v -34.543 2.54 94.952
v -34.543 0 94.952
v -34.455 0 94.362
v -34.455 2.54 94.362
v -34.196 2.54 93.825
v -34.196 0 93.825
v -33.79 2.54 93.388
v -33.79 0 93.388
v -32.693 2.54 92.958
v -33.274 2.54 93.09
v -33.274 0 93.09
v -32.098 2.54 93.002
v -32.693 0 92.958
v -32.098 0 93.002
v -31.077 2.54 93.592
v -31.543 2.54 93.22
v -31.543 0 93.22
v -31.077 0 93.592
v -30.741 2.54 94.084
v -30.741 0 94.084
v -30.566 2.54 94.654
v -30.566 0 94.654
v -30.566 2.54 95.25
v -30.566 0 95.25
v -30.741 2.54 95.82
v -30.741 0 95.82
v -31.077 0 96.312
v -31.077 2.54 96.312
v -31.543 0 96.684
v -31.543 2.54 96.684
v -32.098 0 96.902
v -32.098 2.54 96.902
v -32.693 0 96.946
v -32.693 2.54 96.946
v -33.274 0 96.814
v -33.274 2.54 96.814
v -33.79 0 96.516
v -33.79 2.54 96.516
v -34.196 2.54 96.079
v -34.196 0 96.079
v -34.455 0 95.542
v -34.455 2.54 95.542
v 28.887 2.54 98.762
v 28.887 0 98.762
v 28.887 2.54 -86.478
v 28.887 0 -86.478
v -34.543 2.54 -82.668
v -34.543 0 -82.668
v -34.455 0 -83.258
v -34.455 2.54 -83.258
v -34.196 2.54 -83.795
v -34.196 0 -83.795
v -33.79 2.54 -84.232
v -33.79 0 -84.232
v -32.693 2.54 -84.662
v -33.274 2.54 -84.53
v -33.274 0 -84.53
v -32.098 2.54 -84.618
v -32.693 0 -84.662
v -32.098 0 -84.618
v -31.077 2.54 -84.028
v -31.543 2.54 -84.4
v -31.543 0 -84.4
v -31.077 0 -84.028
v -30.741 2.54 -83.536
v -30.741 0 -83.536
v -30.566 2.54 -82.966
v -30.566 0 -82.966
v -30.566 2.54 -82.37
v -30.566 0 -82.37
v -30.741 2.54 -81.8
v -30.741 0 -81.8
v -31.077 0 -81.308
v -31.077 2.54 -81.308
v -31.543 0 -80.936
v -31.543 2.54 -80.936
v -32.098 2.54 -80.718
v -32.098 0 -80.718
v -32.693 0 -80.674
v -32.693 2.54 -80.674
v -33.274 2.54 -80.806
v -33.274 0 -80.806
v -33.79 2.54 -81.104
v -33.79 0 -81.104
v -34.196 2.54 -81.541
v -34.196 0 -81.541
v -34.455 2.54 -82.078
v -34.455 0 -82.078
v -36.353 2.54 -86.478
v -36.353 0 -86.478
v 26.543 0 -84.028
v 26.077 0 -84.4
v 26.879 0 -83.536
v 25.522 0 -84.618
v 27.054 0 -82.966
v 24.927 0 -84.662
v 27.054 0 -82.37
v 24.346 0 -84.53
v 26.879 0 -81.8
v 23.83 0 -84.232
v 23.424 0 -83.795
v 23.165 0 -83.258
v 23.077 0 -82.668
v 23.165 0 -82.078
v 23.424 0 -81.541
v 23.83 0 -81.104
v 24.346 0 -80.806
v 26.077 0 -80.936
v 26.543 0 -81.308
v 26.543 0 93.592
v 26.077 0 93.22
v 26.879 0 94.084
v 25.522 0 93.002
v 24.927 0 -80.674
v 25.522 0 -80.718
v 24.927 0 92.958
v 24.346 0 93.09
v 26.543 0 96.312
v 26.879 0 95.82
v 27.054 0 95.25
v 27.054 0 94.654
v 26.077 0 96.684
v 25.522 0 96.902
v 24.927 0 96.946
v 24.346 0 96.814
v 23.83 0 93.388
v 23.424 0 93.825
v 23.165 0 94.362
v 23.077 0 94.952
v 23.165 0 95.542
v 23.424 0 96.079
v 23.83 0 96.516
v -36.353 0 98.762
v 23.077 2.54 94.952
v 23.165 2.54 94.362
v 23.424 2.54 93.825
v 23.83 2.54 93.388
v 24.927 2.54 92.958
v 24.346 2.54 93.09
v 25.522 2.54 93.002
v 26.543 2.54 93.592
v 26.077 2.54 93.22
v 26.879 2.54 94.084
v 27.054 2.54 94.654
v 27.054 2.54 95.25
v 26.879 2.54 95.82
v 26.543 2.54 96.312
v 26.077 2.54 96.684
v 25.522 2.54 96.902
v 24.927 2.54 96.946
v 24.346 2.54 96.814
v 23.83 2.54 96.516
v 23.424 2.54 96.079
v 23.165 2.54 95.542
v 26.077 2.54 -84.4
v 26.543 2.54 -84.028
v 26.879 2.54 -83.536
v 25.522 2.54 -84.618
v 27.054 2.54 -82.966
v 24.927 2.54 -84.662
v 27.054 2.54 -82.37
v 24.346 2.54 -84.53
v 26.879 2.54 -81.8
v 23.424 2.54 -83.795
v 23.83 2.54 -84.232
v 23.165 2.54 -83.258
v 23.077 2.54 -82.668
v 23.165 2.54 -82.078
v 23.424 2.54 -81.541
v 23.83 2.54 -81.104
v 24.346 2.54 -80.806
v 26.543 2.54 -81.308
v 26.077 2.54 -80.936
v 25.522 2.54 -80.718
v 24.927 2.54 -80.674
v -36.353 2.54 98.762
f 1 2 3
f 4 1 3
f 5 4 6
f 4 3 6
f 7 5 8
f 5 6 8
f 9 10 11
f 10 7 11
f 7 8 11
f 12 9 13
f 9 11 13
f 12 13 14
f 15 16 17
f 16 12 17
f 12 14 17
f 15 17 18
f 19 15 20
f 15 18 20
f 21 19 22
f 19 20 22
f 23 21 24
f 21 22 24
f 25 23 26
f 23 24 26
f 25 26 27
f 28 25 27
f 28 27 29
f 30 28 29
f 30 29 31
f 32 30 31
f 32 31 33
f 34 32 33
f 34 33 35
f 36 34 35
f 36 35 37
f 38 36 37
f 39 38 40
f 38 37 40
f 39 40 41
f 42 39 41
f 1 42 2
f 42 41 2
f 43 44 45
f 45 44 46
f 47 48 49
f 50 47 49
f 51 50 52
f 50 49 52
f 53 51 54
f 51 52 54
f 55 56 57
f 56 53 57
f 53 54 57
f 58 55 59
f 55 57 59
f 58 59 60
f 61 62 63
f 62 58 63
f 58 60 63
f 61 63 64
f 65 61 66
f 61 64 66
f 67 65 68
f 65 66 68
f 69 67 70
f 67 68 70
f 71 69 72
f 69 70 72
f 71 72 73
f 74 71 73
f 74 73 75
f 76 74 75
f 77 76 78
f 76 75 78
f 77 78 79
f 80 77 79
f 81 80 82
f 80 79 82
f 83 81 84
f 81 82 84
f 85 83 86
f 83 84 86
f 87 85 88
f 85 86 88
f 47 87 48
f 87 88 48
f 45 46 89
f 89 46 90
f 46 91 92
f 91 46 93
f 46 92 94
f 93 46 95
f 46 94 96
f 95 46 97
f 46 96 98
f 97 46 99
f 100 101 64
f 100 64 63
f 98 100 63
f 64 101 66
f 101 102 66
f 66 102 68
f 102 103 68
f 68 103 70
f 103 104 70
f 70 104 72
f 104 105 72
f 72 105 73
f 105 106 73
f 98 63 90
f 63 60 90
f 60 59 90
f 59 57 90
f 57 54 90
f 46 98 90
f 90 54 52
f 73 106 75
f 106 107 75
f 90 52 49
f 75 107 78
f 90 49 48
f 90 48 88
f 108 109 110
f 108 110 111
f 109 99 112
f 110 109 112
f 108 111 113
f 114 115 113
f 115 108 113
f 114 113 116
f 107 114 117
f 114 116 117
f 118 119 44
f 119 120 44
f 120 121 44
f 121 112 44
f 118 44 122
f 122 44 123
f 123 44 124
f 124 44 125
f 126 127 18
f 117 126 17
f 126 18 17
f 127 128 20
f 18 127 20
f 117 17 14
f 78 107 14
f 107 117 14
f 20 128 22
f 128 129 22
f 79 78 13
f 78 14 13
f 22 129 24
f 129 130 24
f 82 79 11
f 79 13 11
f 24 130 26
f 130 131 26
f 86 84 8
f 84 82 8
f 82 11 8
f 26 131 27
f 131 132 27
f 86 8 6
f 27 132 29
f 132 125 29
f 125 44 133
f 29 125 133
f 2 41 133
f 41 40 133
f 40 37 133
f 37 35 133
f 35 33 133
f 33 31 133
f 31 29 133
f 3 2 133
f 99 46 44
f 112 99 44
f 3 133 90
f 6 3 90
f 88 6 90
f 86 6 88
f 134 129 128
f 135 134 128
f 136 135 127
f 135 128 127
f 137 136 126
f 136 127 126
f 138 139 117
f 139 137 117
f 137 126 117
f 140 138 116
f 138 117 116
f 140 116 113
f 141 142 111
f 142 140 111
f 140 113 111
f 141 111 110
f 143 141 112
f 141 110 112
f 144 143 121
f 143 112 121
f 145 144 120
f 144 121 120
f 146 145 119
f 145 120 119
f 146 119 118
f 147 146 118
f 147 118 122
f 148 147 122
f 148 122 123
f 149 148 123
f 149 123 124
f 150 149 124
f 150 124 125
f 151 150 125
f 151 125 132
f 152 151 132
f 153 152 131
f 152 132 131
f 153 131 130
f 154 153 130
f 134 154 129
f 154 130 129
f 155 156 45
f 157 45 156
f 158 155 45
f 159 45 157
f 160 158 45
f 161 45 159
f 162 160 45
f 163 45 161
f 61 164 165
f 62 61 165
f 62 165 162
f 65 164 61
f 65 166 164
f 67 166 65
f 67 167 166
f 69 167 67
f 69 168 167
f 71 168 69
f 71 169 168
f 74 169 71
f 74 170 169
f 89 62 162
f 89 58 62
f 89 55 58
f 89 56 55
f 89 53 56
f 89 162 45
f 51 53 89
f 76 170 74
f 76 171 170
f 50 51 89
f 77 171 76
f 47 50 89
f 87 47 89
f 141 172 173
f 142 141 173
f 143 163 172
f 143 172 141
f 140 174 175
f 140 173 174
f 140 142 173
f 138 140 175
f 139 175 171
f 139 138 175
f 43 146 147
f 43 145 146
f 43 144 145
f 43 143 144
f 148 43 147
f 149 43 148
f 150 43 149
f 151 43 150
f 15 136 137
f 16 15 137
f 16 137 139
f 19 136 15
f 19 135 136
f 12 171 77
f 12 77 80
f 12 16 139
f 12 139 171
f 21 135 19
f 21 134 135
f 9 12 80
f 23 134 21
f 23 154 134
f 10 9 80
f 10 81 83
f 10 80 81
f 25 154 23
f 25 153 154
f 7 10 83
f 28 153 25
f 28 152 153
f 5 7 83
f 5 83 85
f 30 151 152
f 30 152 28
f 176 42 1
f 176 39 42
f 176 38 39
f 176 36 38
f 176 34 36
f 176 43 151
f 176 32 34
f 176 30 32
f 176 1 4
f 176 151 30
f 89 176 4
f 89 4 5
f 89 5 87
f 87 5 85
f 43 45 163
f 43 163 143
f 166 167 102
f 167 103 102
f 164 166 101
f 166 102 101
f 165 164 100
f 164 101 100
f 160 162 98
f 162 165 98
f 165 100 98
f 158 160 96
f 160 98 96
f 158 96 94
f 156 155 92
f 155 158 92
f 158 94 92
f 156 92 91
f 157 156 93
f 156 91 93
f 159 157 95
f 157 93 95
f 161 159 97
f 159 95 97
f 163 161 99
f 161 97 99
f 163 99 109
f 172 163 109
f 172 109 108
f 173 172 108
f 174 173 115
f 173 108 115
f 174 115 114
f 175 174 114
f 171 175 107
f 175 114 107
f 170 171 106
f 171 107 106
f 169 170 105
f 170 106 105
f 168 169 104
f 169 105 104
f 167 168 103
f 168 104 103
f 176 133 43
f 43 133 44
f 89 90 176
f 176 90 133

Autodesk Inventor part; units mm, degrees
ref_plane "YZ Plane" through (0, 0, 0) normal (1, 0, 0) x (0, 1, 0)
ref_plane "XZ Plane" through (0, 0, 0) normal (0, 1, 0) x (-1, 0, 0)
ref_plane "XY Plane" through (0, 0, 0) normal (0, 0, 1) x (1, 0, 0)
sketch "Sketch1" plane through (0, 0, 0) normal (0, 1, 0) x (-1, 0, 0)
  line L0 (28.7334, 91.142) -> (-21.2666, 91.142)
  line L1 (-21.2666, 91.142) -> (-21.2666, -78.858)
  line L2 (-21.2666, -78.858) -> (28.7334, -78.858)
  line L3 (28.7334, -78.858) -> (28.7334, 91.142)
  line L4 (36.3534, 98.762) -> (-28.8866, 98.762)
  line L5 (-28.8866, 98.762) -> (-28.8866, -86.478)
  line L6 (-28.8866, -86.478) -> (36.3534, -86.478)
  line L7 (36.3534, -86.478) -> (36.3534, 98.762)
  circle A0 centre (32.5434, 94.952) radius 2
  circle A1 centre (-25.0766, 94.952) radius 2
  circle A2 centre (-25.0766, -82.668) radius 2
  circle A3 centre (32.5434, -82.668) radius 2
  dimension "d0" = 170
  dimension "d1" = 7.62
  dimension "d9" = 50
  dimension "d34" = 3.81
  dimension "d35" = 3.81
  dimension "d36" = 4
  dimension "d37" = 3.81
  dimension "d38" = 3.81
  dimension "d39" = 4
  dimension "d40" = 3.81
  dimension "d41" = 3.81
  dimension "d42" = 4
  dimension "d43" = 3.81
  dimension "d44" = 3.81
  dimension "d45" = 4
  dimension "d48" = 185.24
extrude "Extrusion1" add sketch "Sketch1" along normal blind 2.54 contours L3 L2 L1 L0 | L7 L6 L5 L4
properties part number "Cover"
